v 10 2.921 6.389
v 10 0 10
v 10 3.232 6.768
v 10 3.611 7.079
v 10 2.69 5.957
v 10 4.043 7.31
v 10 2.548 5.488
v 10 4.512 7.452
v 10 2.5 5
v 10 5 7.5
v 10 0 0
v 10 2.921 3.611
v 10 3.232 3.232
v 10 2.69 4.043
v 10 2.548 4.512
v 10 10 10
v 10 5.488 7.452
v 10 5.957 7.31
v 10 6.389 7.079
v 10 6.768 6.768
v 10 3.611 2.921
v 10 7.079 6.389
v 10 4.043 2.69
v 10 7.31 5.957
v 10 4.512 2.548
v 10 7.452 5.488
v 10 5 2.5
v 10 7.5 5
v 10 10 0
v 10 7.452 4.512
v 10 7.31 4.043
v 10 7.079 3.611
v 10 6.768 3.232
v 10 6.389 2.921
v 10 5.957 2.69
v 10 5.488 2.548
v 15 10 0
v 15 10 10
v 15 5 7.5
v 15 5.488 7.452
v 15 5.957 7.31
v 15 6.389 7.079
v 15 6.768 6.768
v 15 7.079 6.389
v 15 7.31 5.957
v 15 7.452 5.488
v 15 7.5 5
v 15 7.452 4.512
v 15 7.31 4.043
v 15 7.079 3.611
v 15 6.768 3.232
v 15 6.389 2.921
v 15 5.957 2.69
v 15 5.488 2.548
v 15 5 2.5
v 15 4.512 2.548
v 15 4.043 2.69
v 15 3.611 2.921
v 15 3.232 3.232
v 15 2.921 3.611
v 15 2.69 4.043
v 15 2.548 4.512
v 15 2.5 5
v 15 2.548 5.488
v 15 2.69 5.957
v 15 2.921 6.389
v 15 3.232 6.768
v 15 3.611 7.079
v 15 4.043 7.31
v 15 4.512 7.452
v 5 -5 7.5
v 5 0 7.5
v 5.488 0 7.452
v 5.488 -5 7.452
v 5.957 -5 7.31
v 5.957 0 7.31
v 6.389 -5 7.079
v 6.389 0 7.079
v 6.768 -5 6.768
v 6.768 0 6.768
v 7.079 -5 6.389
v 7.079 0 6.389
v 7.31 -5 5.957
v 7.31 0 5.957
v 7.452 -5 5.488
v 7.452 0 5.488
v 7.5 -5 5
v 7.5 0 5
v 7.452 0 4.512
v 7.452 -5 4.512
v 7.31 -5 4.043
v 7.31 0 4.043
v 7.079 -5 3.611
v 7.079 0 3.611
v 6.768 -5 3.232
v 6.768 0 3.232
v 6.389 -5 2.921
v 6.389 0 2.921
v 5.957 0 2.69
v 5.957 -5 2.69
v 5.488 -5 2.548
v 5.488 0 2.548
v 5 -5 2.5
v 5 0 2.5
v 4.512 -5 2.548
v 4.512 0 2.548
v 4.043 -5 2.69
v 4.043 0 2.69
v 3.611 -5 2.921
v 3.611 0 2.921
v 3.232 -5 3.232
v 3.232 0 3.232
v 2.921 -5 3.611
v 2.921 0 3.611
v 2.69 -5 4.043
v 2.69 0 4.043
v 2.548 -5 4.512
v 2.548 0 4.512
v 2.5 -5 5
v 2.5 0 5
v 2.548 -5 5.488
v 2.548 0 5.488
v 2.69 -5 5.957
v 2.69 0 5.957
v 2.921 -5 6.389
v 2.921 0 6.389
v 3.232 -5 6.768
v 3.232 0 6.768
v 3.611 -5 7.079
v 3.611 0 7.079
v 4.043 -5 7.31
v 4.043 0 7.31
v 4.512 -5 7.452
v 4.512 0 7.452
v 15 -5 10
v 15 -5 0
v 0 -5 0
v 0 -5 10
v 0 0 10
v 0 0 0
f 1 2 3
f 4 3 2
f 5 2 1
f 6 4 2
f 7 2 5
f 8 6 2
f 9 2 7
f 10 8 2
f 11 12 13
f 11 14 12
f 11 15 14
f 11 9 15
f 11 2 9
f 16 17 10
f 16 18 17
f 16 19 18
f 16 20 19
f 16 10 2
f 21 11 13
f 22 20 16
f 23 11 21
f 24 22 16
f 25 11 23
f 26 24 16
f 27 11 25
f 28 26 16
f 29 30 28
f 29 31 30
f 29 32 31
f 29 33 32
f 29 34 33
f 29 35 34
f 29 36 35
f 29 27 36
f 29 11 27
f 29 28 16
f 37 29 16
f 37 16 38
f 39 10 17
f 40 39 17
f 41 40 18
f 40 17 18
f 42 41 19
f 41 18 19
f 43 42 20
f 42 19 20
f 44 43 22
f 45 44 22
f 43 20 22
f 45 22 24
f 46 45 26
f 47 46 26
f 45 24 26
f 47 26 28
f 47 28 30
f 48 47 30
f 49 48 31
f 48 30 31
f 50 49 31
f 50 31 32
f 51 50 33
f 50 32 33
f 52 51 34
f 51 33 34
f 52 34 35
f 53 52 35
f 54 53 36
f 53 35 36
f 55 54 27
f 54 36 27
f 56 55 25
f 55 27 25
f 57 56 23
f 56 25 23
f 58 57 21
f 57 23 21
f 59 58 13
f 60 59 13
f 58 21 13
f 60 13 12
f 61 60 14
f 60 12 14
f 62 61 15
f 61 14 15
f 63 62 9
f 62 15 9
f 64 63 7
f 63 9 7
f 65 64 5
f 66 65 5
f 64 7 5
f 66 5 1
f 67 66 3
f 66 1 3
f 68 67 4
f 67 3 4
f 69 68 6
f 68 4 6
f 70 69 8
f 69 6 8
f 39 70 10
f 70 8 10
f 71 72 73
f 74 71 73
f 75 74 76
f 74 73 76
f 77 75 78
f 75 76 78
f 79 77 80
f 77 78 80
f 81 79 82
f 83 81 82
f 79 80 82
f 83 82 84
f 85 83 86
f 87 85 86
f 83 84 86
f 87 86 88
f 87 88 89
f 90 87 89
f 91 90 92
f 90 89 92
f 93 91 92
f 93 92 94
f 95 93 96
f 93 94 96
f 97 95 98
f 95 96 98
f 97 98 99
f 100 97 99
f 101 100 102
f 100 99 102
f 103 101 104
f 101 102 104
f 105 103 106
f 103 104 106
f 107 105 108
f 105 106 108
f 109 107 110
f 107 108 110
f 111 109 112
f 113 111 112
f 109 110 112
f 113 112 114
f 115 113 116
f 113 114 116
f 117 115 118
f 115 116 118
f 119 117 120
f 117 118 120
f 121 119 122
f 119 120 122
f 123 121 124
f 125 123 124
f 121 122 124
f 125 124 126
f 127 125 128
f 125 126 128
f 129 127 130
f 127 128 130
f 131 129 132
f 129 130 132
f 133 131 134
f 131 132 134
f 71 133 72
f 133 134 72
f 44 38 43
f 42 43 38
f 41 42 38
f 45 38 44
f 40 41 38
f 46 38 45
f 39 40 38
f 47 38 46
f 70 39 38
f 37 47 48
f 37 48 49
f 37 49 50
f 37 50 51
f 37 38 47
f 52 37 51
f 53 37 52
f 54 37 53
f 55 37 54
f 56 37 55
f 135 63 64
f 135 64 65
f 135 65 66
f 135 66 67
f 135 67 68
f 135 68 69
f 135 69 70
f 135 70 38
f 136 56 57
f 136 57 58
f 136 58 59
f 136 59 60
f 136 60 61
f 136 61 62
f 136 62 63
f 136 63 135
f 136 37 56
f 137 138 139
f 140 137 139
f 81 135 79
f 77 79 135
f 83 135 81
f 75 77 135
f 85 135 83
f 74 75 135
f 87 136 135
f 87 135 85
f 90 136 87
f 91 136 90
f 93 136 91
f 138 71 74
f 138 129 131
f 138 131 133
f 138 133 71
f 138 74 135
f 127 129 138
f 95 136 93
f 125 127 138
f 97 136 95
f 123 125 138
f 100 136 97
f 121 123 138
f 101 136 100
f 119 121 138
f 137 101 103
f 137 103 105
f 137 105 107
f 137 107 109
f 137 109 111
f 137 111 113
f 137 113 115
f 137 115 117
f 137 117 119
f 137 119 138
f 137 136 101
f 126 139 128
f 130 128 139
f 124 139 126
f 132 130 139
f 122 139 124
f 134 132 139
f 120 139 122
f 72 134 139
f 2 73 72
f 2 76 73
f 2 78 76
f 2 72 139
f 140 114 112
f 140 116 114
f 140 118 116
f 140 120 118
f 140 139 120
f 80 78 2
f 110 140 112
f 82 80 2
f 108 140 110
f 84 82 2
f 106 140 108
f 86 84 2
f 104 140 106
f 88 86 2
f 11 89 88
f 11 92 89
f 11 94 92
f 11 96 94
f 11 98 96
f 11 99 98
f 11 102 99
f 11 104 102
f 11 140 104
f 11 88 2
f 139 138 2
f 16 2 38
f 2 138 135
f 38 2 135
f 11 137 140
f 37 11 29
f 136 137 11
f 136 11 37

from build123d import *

# Parameters (mm, degrees)
BOSS_EXTRUDE1_DEPTH = 10
SKETCH4_R           = 2.5
CUT_EXTRUDE1_DEPTH  = 5
SKETCH5_R           = 2.5
CUT_EXTRUDE2_DEPTH  = 5


with BuildPart() as part:
    # 3DSketch1 → Boss-Extrude1 (new body)
    with BuildSketch(Plane(origin=(0, 0, 0), x_dir=(0.8320502943378437, 0.554700196225229, 0), z_dir=(0, 0, -1))):
        Polygon((0, 0), (8.320502943, 5.547001962), (13.867504906, -2.773500981), (18.027756377, 0), (9.707253434, 12.480754415), (-2.773500981, 4.160251472), align=None)
    extrude(amount=-BOSS_EXTRUDE1_DEPTH)

    # Sketch4 → Cut-Extrude1 (cut)
    with BuildSketch(Plane.ZY.offset(-10)):
        with Locations((5, 5)):
            Circle(SKETCH4_R)
    extrude(amount=-CUT_EXTRUDE1_DEPTH, mode=Mode.SUBTRACT)

    # Sketch5 → Cut-Extrude2 (cut)
    with BuildSketch(Plane(origin=(0, 0, 0), x_dir=(1, 0, 0), z_dir=(0, 1, 0))):
        with Locations(Location((5, -5, 0), (0, 0, 270))):
            Circle(SKETCH5_R)
    extrude(amount=-CUT_EXTRUDE2_DEPTH, mode=Mode.SUBTRACT)


solid = part.part
